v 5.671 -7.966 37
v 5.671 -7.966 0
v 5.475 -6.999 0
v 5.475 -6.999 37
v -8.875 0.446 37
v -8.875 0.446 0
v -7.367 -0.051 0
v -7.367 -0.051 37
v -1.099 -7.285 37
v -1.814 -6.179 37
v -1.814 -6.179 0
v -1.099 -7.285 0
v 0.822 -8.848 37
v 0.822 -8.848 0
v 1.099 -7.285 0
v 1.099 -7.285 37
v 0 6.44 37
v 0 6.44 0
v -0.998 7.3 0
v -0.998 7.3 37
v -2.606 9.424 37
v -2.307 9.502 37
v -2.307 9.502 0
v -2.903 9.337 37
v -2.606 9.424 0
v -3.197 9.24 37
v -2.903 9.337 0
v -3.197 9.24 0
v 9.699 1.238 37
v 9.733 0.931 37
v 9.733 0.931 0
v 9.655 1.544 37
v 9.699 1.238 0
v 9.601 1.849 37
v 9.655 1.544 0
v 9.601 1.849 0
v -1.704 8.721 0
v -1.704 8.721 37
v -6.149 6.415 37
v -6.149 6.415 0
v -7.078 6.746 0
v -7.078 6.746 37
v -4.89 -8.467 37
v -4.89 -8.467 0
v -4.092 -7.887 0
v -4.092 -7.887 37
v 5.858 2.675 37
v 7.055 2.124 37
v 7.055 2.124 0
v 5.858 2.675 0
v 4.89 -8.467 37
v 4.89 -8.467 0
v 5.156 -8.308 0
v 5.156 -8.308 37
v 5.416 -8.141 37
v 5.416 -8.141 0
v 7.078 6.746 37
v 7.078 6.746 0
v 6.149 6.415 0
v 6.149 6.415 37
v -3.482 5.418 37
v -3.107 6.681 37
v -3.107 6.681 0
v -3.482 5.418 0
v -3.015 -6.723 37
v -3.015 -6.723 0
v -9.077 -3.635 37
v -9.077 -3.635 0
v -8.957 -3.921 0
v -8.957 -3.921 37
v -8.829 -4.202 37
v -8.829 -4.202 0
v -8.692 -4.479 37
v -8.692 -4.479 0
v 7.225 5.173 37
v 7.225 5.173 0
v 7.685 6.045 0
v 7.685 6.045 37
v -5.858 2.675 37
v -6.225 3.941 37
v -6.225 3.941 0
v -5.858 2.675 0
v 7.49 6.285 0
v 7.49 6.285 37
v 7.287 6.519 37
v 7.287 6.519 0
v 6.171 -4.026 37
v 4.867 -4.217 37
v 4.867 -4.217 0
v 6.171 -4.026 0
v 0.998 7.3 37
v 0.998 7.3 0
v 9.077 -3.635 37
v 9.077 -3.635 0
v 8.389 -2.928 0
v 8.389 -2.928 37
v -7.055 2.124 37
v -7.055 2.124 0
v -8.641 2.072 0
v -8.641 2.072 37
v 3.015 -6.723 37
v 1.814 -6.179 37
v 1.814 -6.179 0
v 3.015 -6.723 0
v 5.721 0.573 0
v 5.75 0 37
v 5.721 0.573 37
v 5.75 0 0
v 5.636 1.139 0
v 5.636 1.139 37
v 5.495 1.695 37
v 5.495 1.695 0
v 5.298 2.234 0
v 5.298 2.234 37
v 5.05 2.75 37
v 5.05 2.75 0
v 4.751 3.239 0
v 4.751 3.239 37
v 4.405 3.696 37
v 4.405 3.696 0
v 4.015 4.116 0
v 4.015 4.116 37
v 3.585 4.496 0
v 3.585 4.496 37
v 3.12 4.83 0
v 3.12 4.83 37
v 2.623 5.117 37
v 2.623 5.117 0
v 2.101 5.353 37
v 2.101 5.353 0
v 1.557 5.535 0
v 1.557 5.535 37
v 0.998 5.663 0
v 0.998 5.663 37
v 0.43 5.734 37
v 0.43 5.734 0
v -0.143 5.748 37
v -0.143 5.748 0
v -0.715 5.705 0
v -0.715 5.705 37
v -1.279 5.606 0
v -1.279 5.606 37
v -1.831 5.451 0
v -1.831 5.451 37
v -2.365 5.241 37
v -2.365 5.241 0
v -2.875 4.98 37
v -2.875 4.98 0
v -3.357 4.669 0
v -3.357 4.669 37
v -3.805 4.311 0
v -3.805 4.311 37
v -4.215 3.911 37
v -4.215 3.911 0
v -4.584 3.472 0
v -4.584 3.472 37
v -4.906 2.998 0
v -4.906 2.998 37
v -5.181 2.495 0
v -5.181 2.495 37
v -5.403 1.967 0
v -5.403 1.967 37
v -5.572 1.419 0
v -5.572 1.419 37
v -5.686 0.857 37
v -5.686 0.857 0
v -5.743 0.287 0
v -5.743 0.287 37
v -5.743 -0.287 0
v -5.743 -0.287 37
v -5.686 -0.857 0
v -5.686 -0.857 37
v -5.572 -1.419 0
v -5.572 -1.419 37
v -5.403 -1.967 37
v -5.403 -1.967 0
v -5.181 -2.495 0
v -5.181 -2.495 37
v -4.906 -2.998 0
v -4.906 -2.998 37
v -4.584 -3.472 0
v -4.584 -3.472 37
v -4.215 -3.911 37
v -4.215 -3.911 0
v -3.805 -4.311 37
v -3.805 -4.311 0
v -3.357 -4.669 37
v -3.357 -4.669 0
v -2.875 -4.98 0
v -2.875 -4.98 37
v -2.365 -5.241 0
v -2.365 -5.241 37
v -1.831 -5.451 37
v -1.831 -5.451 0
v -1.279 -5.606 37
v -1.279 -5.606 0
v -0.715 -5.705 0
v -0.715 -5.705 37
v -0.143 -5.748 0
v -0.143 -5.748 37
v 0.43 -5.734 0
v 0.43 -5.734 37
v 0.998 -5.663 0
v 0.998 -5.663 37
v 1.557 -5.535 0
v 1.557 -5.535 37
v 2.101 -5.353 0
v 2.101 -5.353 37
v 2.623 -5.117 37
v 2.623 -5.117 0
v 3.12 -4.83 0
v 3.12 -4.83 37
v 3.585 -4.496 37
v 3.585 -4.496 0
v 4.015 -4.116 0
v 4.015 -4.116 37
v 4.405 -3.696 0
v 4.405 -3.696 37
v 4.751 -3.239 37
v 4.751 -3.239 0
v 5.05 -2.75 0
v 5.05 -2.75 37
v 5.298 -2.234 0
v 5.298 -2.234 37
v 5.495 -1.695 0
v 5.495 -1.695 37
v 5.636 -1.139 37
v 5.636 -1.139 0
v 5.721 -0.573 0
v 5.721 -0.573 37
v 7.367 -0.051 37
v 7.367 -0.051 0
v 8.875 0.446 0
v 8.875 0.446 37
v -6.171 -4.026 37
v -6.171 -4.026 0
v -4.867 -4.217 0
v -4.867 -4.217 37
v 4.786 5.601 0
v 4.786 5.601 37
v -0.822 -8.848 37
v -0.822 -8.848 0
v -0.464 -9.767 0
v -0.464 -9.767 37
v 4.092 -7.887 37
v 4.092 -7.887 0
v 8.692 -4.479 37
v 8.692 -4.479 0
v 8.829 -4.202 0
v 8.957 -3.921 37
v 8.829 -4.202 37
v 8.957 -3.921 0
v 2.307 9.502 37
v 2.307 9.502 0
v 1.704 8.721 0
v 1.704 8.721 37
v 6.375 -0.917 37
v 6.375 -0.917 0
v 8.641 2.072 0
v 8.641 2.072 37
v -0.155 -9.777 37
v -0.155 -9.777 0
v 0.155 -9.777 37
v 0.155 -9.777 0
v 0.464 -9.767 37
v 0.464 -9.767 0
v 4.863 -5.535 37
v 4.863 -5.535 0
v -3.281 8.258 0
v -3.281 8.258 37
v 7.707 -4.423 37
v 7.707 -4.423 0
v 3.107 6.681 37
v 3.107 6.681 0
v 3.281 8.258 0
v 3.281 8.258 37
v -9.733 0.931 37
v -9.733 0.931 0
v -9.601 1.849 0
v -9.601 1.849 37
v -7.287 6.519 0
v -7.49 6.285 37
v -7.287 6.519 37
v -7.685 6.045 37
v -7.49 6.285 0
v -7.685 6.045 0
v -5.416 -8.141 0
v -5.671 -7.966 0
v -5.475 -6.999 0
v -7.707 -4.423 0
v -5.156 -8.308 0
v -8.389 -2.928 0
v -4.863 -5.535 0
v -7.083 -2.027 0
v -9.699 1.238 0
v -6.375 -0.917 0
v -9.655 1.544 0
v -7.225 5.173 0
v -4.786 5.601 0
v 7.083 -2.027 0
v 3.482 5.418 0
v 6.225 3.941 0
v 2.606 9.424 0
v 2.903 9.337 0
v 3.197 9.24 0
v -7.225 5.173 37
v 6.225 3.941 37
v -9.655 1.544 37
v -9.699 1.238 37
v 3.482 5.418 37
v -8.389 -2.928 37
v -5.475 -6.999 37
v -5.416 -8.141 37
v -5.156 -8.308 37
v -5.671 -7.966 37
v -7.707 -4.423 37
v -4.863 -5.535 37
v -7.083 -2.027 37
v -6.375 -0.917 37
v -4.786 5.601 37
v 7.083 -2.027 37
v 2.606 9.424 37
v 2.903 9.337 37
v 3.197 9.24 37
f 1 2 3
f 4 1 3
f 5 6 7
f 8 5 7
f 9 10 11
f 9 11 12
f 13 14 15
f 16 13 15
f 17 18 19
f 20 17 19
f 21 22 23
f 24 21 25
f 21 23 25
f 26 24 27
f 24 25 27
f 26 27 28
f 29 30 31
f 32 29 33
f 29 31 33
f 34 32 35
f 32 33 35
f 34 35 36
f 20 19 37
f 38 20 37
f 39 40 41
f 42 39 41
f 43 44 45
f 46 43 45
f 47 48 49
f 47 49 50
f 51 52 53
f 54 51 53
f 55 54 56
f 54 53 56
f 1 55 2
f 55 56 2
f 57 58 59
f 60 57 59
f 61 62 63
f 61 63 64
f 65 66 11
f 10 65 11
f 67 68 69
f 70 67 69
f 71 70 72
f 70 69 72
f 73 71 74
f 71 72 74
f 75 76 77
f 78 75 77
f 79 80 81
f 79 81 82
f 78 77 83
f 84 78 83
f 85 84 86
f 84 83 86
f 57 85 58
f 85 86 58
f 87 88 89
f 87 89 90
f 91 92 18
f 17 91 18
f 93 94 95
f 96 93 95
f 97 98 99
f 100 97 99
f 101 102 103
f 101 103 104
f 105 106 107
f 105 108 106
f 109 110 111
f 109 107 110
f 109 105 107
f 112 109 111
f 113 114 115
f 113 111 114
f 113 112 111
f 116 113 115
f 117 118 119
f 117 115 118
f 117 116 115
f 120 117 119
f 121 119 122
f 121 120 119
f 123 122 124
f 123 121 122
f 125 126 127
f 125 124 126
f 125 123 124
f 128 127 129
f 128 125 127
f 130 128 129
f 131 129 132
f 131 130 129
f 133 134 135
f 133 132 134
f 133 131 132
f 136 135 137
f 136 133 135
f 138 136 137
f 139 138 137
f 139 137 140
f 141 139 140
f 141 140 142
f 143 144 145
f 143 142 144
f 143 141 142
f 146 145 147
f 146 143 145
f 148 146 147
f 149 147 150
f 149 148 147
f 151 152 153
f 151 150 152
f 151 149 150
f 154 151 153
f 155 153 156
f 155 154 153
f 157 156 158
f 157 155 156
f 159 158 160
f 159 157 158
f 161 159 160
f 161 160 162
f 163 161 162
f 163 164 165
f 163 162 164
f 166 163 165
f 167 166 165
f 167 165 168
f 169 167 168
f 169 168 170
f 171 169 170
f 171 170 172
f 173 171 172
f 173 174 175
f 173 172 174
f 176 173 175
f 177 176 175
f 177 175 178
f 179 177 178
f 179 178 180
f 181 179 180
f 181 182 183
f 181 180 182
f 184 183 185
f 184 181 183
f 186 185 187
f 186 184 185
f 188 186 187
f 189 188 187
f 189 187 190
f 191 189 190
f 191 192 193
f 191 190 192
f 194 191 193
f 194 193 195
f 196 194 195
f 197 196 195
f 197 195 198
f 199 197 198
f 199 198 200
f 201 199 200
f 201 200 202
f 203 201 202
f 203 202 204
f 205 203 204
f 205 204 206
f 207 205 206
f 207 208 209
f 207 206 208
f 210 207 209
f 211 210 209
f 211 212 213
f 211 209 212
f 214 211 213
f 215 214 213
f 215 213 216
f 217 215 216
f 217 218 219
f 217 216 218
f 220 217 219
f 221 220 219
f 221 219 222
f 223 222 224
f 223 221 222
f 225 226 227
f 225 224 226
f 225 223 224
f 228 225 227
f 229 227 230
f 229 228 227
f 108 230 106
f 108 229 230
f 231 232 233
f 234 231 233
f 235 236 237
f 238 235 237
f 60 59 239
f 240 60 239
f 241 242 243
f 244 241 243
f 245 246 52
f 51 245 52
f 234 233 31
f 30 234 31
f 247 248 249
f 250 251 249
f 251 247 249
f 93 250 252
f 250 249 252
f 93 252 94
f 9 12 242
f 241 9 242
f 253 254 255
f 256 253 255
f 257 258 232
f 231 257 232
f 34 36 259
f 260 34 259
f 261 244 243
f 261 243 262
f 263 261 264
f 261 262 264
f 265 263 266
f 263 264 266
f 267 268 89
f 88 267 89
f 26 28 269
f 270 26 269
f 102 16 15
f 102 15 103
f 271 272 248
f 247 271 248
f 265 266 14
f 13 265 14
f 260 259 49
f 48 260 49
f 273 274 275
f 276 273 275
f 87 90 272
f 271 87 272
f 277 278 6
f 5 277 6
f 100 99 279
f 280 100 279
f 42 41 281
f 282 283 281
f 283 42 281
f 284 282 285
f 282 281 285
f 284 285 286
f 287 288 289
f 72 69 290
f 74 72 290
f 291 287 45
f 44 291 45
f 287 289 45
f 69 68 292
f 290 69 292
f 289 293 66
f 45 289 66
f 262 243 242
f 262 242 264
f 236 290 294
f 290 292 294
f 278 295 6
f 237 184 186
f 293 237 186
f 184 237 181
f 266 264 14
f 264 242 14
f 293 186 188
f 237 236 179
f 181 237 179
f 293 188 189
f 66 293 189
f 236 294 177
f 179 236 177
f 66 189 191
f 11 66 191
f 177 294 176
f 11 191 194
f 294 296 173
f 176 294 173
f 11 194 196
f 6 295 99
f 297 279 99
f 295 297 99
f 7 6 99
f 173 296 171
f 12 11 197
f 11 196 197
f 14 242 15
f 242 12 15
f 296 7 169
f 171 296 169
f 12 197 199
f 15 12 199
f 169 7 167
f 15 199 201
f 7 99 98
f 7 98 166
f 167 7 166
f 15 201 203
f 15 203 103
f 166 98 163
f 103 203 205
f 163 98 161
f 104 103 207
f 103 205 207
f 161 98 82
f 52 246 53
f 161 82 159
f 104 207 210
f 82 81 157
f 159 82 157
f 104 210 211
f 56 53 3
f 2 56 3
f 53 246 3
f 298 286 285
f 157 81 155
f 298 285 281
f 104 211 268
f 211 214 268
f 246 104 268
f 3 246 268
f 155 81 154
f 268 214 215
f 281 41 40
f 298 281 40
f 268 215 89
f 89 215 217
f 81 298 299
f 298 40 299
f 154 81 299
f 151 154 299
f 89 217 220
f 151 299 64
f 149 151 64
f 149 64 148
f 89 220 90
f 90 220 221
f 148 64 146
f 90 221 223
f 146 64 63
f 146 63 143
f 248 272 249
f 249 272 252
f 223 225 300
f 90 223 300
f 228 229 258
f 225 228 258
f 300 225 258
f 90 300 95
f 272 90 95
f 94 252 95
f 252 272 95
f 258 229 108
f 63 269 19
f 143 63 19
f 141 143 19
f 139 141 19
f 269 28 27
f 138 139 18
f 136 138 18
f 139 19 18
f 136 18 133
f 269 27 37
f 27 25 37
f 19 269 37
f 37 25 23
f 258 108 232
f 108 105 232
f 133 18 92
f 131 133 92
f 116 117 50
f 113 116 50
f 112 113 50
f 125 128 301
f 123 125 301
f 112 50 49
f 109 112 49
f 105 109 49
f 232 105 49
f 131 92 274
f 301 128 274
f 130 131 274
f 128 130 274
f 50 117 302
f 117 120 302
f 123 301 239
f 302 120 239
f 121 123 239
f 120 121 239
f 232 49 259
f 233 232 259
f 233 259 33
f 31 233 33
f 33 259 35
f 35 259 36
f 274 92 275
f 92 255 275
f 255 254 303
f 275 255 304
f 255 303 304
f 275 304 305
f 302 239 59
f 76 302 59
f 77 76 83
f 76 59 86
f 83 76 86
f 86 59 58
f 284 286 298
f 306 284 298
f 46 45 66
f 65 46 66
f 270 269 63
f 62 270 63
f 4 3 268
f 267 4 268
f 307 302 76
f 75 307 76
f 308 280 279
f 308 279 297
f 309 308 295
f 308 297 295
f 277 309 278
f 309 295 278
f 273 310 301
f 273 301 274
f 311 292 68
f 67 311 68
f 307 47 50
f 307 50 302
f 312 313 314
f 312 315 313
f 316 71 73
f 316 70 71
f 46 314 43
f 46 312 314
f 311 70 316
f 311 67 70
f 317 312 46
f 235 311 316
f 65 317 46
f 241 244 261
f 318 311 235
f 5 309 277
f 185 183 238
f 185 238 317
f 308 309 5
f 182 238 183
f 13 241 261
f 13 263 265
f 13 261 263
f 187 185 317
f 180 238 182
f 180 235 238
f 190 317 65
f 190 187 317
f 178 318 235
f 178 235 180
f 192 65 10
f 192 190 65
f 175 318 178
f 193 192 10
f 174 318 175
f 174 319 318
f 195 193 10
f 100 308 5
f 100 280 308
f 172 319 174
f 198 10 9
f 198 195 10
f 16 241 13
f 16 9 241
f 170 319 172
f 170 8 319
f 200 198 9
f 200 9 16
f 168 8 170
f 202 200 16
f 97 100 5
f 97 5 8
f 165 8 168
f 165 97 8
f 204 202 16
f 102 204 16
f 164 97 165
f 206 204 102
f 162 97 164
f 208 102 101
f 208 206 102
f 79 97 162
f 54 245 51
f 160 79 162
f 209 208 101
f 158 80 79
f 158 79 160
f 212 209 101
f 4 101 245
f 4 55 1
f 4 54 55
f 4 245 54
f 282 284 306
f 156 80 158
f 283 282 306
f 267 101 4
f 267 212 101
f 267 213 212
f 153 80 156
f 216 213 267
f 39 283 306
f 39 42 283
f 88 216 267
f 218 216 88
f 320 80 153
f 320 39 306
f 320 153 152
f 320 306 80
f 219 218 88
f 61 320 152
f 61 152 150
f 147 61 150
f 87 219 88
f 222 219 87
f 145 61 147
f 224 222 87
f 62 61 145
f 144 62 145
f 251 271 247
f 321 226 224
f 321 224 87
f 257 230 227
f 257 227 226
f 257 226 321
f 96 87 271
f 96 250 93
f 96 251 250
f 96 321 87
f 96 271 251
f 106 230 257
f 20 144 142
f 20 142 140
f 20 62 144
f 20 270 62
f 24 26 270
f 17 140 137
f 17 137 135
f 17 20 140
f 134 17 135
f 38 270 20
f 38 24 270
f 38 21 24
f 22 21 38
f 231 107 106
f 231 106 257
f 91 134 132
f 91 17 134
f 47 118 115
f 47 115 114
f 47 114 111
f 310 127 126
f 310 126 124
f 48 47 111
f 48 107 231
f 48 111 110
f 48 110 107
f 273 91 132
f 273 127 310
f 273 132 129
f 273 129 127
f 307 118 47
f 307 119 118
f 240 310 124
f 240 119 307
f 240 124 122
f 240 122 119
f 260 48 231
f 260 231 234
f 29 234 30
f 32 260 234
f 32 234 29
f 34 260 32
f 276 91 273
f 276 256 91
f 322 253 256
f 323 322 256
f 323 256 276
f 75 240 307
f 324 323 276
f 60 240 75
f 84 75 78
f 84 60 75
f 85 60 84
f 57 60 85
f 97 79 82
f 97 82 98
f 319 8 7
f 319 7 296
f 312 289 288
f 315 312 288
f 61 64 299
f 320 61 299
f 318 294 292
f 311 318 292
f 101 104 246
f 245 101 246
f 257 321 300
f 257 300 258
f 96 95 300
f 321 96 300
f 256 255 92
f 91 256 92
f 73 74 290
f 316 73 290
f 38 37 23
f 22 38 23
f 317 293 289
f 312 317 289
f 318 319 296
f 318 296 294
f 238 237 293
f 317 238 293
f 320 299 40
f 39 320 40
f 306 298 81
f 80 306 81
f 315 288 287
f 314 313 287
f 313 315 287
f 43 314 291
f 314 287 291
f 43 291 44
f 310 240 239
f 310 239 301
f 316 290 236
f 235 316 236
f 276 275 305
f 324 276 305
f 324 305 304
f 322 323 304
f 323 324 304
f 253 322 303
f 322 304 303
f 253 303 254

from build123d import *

# Parameters (mm, degrees)
SKETCH1_R               = 9.7778
BOSS_EXTRUDE1_DEPTH     = 37
CUT_EXTRUDE1_DEPTH      = 40.499503107
CUT_EXTRUDE2_DEPTH      = 40.499503107
CUT_EXTRUDE2_DEPTH_BACK = 40.499503107
SKETCH4_R               = 5.75
CIRPATTERN1_COUNT       = 11


with BuildPart() as part:
    # Sketch1 → Boss-Extrude1 (new body)
    with BuildSketch(Plane.XY):
        Circle(SKETCH1_R)
    extrude(amount=BOSS_EXTRUDE1_DEPTH)

    # Sketch2 → Cut-Extrude1 (cut, through all)
    with BuildSketch(Plane.XY):
        Polygon((0, 6.440231992), (-0.998470792, 7.29965938), (-1.704297747, 8.720724317), (-2.306603416, 9.501839481), (-1.704297747, 10.285038999), (0, 10.999278518), (1.704297747, 10.285038999), (2.306603416, 9.501839481), (1.704297747, 8.720724317), (0.998470792, 7.29965938), align=None)
    cut_extrude1 = extrude(amount=CUT_EXTRUDE1_DEPTH, mode=Mode.SUBTRACT)

    # Sketch4 → Cut-Extrude2 (cut, two sides: drawn at the far end of the back side and taken through both)
    with BuildSketch(Plane.XY.offset(37).offset(-CUT_EXTRUDE2_DEPTH_BACK)):
        Circle(SKETCH4_R)
    extrude(amount=CUT_EXTRUDE2_DEPTH + CUT_EXTRUDE2_DEPTH_BACK, mode=Mode.SUBTRACT)

    # CirPattern1: Cut-Extrude1 ×11 about axis
    cirpattern1_axis = Axis((0, 0, 0), (0, 0, 1))
    for i in range(1, CIRPATTERN1_COUNT):
        add(cut_extrude1.rotate(cirpattern1_axis, i * 360 / CIRPATTERN1_COUNT), mode=Mode.SUBTRACT)


solid = part.part
